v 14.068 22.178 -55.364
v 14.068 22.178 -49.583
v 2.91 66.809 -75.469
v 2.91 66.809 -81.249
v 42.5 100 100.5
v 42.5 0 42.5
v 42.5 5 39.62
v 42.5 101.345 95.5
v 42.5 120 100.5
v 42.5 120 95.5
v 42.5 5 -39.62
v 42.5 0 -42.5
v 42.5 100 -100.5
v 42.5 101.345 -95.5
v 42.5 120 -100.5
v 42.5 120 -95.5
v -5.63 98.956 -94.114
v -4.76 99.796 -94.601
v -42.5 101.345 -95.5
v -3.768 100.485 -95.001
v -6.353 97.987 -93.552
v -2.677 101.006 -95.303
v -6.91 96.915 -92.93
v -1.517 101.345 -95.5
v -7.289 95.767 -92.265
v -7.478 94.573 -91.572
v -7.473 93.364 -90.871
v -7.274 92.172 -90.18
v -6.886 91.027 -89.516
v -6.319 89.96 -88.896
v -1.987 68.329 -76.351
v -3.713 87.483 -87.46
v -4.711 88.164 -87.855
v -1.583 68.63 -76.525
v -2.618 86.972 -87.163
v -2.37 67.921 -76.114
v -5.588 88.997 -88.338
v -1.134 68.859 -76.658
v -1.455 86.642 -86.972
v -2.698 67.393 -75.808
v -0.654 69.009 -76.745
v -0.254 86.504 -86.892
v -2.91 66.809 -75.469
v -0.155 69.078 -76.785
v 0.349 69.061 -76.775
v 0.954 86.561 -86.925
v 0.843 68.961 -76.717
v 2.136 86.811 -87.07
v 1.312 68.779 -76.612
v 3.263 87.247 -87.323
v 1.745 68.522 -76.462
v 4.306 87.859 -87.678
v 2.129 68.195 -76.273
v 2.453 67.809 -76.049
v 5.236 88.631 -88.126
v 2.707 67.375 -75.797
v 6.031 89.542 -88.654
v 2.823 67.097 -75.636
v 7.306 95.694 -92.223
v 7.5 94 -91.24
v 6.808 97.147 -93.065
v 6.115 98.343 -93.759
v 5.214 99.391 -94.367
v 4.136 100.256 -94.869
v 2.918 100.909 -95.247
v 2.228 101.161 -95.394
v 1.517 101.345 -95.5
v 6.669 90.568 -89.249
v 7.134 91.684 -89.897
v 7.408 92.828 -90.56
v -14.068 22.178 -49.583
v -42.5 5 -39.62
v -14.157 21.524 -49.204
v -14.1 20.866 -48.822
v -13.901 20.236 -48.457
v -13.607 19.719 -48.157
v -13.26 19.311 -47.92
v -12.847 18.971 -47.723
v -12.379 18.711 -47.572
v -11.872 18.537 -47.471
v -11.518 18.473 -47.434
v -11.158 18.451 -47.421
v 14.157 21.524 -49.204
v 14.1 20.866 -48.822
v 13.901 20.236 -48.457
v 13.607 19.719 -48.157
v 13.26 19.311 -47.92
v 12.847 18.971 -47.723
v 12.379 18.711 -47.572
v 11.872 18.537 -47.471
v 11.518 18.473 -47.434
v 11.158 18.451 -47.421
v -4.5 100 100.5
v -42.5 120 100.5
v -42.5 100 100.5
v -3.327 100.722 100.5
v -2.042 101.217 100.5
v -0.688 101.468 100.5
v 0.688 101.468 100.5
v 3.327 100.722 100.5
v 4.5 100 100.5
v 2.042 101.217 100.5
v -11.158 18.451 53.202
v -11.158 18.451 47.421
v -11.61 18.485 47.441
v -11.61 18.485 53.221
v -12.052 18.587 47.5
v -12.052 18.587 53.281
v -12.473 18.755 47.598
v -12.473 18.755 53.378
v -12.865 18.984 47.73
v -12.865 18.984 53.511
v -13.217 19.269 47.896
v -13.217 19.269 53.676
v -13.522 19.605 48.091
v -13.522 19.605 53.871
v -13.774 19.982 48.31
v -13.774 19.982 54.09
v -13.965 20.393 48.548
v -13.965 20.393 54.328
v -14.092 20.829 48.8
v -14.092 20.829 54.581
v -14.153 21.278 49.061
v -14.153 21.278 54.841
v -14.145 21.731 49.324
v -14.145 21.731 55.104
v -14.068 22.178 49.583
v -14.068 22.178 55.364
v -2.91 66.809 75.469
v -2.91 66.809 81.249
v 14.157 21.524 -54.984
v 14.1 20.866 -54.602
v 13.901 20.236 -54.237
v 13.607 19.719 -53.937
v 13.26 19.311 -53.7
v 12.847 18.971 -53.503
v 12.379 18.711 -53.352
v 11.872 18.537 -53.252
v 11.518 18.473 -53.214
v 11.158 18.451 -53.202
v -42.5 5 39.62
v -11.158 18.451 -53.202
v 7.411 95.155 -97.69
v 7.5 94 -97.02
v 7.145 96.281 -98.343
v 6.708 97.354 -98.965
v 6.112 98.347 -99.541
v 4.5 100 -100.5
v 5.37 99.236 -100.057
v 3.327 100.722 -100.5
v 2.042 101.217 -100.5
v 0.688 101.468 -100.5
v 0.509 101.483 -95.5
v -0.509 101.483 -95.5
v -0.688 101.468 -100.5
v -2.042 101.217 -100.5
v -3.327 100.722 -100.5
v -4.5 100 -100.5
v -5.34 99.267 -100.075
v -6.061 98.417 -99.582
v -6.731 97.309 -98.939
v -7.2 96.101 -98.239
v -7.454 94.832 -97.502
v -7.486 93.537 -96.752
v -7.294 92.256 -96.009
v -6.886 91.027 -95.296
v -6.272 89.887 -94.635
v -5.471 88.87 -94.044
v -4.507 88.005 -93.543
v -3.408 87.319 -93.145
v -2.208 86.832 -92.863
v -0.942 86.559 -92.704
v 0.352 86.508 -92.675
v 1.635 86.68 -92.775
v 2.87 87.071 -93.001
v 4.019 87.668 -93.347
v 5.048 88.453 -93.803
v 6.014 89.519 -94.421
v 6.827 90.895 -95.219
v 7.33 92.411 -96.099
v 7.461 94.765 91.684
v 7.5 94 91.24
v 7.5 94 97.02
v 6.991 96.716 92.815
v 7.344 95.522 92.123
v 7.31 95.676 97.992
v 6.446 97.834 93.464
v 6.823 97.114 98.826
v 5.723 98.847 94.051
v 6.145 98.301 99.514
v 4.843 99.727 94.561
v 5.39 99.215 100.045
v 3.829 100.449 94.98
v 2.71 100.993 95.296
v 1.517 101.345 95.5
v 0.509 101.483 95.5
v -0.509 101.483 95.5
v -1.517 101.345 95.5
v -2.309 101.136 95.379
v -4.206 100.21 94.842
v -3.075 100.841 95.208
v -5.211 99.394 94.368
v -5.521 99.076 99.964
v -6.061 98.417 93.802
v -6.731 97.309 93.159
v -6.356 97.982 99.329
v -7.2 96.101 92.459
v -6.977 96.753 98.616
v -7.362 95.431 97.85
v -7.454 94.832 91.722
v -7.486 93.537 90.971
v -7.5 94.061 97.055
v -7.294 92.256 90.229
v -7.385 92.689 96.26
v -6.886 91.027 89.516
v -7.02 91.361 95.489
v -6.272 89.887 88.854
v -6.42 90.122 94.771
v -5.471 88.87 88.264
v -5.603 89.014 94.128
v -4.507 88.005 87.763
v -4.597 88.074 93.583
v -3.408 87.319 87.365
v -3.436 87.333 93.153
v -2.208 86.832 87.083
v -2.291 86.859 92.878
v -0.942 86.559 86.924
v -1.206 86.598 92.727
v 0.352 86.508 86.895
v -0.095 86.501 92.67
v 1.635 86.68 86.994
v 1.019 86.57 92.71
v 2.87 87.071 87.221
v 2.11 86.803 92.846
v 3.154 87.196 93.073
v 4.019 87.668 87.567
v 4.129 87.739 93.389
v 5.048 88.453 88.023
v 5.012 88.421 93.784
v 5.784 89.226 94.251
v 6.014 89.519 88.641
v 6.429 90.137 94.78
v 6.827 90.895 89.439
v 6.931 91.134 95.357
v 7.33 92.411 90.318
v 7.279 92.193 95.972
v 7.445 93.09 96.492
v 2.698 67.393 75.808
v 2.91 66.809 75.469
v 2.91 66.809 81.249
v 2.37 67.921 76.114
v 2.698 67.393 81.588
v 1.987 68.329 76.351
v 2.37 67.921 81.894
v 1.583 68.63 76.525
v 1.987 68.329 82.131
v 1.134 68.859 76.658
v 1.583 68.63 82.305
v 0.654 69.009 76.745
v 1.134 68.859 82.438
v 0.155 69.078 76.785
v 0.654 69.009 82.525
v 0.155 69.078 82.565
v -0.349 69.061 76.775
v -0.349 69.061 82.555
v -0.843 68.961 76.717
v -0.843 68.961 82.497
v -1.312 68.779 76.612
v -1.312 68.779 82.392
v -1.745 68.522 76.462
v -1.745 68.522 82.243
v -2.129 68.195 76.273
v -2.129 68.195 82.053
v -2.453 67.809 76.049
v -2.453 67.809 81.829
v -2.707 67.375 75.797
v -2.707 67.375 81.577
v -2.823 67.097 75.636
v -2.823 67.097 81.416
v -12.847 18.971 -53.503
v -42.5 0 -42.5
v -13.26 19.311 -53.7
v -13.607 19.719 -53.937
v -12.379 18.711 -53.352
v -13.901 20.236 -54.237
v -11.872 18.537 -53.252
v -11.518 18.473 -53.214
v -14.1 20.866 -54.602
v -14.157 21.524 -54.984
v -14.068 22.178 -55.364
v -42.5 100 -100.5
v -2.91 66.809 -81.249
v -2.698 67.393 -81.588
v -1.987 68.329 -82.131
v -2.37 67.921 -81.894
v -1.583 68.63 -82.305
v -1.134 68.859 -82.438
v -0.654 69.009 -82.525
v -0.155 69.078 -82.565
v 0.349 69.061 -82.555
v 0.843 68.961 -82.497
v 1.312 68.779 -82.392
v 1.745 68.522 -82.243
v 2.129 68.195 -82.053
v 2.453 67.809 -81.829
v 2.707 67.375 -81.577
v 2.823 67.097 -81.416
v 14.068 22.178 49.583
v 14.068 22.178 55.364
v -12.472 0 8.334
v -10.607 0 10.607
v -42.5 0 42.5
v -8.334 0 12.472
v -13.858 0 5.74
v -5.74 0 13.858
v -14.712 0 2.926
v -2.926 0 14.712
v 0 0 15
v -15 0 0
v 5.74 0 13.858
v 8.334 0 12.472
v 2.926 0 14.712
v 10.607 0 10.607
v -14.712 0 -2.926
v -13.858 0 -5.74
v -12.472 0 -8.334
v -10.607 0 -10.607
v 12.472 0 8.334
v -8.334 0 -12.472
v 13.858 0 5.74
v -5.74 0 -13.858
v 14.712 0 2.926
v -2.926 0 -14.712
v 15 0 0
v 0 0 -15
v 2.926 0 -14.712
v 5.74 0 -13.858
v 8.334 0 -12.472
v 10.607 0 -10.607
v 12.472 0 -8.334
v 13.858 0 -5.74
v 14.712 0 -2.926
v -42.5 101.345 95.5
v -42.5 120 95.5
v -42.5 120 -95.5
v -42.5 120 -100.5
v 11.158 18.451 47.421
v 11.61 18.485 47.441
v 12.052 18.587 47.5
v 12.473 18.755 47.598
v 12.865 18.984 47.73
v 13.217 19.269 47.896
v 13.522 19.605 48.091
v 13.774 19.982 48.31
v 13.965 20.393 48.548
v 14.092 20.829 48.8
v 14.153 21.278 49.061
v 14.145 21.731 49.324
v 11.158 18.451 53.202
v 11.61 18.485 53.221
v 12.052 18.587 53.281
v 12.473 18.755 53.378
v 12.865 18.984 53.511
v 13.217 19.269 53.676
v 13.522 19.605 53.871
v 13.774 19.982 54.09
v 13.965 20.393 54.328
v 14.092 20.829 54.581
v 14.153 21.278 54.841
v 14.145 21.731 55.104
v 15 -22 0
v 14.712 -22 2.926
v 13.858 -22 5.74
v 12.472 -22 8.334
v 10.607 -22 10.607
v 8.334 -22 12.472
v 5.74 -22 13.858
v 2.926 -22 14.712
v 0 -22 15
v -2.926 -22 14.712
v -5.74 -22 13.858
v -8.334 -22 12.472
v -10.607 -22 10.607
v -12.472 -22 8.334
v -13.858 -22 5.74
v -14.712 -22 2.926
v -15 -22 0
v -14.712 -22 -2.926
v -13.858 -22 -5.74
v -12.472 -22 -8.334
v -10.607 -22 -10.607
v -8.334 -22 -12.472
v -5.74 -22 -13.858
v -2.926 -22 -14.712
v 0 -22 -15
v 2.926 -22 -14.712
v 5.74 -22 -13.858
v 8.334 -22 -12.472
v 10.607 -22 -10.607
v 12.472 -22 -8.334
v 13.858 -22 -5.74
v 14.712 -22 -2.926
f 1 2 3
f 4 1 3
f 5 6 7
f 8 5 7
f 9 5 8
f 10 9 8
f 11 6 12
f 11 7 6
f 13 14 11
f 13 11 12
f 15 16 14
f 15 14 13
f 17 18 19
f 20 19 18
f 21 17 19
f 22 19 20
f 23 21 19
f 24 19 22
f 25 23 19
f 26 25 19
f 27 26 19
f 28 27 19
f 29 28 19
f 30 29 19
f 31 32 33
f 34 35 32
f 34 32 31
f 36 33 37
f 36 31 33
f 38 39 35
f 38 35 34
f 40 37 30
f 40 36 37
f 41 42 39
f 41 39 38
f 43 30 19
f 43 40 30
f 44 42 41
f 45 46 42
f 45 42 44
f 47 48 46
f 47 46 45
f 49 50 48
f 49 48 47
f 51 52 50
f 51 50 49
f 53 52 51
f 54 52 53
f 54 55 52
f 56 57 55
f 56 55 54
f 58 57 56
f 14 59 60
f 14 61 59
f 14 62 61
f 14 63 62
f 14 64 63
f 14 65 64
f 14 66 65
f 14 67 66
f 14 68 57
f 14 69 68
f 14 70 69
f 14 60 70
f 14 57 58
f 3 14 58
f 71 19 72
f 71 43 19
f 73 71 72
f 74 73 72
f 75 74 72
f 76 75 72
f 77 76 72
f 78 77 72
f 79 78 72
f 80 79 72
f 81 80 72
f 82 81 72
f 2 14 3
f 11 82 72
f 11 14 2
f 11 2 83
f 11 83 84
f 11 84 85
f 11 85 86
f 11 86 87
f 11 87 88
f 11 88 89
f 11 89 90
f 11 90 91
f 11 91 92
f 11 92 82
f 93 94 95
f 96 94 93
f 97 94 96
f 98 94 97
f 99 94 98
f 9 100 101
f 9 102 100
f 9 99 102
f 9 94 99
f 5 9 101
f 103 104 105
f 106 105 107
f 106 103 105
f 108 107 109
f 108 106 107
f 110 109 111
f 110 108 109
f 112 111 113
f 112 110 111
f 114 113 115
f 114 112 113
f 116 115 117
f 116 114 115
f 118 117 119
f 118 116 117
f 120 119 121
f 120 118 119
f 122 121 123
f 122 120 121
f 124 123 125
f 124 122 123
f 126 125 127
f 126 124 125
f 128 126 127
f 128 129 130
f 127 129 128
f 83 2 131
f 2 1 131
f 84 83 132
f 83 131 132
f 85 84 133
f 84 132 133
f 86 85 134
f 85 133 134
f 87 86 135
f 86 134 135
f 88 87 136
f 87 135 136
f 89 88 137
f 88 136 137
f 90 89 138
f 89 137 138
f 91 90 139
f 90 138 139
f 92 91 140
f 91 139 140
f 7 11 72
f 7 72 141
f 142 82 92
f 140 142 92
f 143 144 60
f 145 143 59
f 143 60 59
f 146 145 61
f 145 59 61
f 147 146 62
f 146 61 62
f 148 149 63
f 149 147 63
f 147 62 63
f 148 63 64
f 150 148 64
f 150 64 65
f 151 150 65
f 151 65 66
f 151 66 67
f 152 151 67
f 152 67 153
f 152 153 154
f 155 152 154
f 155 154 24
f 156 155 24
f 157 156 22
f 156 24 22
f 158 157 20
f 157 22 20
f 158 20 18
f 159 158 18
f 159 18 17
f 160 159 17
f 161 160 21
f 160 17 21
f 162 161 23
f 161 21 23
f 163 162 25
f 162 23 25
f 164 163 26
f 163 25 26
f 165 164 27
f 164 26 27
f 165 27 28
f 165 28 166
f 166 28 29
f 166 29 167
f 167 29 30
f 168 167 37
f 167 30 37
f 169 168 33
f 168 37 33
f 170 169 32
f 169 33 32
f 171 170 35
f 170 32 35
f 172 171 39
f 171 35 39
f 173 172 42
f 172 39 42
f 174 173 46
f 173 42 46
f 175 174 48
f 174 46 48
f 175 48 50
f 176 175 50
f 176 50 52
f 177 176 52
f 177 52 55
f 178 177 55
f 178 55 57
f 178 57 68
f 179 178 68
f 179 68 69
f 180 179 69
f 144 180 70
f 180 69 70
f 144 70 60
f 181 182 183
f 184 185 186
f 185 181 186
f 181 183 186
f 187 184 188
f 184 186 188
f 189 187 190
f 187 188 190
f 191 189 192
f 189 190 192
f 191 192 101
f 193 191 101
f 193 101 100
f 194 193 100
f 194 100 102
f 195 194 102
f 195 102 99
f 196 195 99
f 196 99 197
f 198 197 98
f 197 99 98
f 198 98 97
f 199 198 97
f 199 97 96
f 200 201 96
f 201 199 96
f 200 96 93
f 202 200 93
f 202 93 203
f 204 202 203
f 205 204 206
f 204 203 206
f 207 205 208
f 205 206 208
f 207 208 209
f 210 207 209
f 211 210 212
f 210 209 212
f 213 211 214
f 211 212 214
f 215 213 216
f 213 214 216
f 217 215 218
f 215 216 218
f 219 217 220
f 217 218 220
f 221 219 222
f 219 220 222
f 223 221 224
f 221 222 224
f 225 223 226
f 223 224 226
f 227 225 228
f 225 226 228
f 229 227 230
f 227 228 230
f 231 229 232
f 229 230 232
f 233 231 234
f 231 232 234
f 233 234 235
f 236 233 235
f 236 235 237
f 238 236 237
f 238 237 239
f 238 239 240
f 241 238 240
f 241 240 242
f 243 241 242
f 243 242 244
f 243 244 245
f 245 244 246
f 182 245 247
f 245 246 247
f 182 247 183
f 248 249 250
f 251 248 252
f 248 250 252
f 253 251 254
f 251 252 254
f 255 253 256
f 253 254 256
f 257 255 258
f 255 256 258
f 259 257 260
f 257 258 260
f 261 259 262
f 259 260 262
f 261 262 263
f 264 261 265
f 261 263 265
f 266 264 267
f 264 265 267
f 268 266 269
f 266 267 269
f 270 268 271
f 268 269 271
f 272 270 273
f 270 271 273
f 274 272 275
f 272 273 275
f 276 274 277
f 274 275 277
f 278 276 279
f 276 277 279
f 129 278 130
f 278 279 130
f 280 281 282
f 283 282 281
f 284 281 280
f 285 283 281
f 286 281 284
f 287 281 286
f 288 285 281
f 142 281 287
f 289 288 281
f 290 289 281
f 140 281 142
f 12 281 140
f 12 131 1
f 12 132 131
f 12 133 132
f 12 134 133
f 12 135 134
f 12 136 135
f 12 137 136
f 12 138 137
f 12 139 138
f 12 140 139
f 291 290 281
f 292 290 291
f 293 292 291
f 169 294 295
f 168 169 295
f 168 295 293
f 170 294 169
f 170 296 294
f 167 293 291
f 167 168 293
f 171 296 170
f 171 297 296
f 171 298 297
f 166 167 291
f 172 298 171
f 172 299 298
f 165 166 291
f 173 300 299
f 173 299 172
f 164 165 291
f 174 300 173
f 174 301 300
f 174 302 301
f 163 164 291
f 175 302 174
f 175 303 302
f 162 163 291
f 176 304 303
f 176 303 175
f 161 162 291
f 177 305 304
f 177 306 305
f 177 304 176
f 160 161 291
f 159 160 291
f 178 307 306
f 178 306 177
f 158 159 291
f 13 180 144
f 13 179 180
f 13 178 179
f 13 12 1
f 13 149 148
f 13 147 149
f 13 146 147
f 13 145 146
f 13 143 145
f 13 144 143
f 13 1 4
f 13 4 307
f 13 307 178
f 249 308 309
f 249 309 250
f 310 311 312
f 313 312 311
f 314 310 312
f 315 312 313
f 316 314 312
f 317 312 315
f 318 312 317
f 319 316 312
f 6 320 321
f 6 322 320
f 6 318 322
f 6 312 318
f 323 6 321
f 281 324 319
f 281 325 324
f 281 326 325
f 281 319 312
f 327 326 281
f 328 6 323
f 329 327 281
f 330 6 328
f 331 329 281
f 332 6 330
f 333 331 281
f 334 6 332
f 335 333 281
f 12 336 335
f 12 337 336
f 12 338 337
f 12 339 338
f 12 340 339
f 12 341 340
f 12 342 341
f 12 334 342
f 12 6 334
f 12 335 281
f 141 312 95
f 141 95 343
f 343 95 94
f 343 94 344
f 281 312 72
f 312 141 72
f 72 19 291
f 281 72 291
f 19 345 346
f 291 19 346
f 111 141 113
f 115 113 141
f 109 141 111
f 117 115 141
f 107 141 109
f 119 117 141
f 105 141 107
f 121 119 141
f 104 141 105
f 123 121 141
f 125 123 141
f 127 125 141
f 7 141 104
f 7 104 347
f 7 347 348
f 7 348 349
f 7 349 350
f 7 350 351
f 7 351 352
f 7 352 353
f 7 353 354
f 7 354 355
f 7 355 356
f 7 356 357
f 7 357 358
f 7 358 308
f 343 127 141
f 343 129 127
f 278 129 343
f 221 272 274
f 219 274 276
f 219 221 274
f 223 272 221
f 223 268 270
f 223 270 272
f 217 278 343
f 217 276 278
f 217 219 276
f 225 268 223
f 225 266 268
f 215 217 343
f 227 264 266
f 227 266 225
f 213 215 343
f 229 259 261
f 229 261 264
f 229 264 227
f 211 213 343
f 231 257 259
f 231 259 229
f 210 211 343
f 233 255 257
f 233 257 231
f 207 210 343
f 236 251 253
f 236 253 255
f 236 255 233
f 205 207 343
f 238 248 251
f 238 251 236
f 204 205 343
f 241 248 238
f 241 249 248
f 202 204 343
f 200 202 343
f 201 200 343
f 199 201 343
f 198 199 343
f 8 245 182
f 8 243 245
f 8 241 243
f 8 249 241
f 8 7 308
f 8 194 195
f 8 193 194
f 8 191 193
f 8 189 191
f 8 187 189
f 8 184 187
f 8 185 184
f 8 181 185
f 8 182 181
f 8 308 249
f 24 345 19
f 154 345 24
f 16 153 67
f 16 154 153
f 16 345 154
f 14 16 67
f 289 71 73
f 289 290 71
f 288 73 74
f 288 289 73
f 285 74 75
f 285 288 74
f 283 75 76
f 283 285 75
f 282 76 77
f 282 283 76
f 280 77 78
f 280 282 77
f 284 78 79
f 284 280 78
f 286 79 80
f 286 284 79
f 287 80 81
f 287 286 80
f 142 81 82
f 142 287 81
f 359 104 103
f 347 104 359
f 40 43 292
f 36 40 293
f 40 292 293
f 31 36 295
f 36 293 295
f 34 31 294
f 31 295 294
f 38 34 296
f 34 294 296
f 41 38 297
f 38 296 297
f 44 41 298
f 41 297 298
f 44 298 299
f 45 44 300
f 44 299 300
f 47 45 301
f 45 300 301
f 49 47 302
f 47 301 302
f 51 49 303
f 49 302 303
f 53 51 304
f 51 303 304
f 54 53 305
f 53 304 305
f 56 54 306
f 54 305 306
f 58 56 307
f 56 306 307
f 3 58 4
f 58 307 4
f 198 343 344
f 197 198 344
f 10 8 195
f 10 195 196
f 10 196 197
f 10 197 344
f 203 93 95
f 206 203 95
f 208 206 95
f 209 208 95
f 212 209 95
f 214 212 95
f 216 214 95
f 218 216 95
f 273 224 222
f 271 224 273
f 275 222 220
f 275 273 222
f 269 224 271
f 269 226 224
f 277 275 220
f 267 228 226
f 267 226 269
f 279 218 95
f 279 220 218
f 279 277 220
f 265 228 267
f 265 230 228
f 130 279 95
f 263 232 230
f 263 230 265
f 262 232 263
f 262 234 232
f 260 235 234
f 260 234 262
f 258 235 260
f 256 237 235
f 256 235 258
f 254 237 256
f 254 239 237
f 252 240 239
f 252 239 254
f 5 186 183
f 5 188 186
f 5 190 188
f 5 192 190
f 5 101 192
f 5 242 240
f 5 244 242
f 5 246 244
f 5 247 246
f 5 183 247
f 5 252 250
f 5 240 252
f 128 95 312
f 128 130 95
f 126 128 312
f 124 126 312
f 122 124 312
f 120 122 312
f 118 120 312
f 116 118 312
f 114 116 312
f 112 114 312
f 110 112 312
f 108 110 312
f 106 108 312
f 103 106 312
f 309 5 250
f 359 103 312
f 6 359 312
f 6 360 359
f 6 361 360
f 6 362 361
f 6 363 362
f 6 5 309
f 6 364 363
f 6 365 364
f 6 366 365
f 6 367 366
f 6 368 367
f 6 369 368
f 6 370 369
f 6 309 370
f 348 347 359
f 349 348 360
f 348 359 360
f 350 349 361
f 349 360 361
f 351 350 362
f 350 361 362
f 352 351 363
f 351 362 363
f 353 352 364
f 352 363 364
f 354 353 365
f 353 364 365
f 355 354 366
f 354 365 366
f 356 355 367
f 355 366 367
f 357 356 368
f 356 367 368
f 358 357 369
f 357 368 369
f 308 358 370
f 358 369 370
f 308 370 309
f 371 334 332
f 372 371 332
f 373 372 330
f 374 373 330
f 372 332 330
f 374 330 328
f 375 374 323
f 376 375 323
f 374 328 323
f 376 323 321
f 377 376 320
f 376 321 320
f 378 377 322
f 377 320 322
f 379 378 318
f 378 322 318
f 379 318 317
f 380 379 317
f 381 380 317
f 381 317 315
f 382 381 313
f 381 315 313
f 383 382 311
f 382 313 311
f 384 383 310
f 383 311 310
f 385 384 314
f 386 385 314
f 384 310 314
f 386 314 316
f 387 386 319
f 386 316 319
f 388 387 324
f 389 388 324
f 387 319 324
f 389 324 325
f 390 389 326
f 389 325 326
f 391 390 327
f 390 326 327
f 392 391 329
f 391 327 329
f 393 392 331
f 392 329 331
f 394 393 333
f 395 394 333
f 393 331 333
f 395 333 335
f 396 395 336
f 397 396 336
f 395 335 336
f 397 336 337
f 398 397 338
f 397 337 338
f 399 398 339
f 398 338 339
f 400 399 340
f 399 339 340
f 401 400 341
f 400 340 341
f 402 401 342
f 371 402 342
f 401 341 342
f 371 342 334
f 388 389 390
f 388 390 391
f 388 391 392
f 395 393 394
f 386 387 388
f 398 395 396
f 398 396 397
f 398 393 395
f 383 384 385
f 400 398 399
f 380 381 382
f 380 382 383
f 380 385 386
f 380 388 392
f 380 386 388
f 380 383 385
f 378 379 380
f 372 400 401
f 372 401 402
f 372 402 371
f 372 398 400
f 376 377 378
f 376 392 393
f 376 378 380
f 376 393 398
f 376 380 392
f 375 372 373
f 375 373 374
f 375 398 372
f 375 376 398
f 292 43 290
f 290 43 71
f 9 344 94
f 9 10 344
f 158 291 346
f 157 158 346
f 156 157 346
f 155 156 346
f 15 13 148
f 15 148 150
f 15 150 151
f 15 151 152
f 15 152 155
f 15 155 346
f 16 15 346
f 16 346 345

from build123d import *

# Parameters (mm, degrees)
EXTRUDE_1_DEPTH          = 42.5
SKETCH_3_R               = 15
EXTRUDE_2_DEPTH          = 22
CUT_EXTRUDE_1_DEPTH      = 101.5
CUT_EXTRUDE_1_DEPTH_BACK = 101.5
FILLET_1_R               = 3
SKETCH_5_R               = 7.5
CUT_EXTRUDE_2_DEPTH      = 202


with BuildPart() as part:
    # 草图1 → 凸台-拉伸1 (new body, symmetric)
    with BuildSketch(Plane(origin=(0, 0, 0), x_dir=(0, 0, -1), z_dir=(1, 0, 0))):
        Polygon((-100.5, 100), (-42.5, 0), (42.5, 0), (100.5, 100), (100.5, 120), (95.5, 120), (95.5, 115), (95.5, 101.345066218), (39.619861593, 5), (-39.619861593, 5), (-95.5, 101.345066218), (-95.5, 115), (-95.5, 120), (-100.5, 120), align=None)
    extrude(amount=EXTRUDE_1_DEPTH, both=True)

    # 草图3 → 凸台-拉伸2 (add)
    with BuildSketch(Plane.XZ):
        Circle(SKETCH_3_R)
    extrude(amount=EXTRUDE_2_DEPTH)

    # 草图4 → 切除-拉伸1 (cut, two sides)
    with BuildSketch(Plane.XY) as cut_extrude_1_sk:
        Polygon((0, 78.450873214), (-15, 18.450873214), (15, 18.450873214), align=None)
    extrude(amount=CUT_EXTRUDE_1_DEPTH, mode=Mode.SUBTRACT)
    extrude(cut_extrude_1_sk.sketch, amount=-CUT_EXTRUDE_1_DEPTH_BACK, mode=Mode.SUBTRACT)

    # 圆角1
    fillet_1_edges = [part.edges().sort_by_distance(p)[0] for p in [
        (0, 78.450873214, -85.111437261),
        (0, 78.450873214, 85.111437261),
        (15, 18.450873214, -50.311437261),
        (15, 18.450873214, 50.311437261),
        (-15, 18.450873214, -50.311437261),
        (-15, 18.450873214, 50.311437261),
    ]]
    fillet(fillet_1_edges, radius=FILLET_1_R)

    # 草图5 → 切除-拉伸2 (cut, through all)
    with BuildSketch(Plane.XY.offset(100.5)):
        with Locations((0, 94)):
            Circle(SKETCH_5_R)
    extrude(amount=-CUT_EXTRUDE_2_DEPTH, mode=Mode.SUBTRACT)


solid = part.part
